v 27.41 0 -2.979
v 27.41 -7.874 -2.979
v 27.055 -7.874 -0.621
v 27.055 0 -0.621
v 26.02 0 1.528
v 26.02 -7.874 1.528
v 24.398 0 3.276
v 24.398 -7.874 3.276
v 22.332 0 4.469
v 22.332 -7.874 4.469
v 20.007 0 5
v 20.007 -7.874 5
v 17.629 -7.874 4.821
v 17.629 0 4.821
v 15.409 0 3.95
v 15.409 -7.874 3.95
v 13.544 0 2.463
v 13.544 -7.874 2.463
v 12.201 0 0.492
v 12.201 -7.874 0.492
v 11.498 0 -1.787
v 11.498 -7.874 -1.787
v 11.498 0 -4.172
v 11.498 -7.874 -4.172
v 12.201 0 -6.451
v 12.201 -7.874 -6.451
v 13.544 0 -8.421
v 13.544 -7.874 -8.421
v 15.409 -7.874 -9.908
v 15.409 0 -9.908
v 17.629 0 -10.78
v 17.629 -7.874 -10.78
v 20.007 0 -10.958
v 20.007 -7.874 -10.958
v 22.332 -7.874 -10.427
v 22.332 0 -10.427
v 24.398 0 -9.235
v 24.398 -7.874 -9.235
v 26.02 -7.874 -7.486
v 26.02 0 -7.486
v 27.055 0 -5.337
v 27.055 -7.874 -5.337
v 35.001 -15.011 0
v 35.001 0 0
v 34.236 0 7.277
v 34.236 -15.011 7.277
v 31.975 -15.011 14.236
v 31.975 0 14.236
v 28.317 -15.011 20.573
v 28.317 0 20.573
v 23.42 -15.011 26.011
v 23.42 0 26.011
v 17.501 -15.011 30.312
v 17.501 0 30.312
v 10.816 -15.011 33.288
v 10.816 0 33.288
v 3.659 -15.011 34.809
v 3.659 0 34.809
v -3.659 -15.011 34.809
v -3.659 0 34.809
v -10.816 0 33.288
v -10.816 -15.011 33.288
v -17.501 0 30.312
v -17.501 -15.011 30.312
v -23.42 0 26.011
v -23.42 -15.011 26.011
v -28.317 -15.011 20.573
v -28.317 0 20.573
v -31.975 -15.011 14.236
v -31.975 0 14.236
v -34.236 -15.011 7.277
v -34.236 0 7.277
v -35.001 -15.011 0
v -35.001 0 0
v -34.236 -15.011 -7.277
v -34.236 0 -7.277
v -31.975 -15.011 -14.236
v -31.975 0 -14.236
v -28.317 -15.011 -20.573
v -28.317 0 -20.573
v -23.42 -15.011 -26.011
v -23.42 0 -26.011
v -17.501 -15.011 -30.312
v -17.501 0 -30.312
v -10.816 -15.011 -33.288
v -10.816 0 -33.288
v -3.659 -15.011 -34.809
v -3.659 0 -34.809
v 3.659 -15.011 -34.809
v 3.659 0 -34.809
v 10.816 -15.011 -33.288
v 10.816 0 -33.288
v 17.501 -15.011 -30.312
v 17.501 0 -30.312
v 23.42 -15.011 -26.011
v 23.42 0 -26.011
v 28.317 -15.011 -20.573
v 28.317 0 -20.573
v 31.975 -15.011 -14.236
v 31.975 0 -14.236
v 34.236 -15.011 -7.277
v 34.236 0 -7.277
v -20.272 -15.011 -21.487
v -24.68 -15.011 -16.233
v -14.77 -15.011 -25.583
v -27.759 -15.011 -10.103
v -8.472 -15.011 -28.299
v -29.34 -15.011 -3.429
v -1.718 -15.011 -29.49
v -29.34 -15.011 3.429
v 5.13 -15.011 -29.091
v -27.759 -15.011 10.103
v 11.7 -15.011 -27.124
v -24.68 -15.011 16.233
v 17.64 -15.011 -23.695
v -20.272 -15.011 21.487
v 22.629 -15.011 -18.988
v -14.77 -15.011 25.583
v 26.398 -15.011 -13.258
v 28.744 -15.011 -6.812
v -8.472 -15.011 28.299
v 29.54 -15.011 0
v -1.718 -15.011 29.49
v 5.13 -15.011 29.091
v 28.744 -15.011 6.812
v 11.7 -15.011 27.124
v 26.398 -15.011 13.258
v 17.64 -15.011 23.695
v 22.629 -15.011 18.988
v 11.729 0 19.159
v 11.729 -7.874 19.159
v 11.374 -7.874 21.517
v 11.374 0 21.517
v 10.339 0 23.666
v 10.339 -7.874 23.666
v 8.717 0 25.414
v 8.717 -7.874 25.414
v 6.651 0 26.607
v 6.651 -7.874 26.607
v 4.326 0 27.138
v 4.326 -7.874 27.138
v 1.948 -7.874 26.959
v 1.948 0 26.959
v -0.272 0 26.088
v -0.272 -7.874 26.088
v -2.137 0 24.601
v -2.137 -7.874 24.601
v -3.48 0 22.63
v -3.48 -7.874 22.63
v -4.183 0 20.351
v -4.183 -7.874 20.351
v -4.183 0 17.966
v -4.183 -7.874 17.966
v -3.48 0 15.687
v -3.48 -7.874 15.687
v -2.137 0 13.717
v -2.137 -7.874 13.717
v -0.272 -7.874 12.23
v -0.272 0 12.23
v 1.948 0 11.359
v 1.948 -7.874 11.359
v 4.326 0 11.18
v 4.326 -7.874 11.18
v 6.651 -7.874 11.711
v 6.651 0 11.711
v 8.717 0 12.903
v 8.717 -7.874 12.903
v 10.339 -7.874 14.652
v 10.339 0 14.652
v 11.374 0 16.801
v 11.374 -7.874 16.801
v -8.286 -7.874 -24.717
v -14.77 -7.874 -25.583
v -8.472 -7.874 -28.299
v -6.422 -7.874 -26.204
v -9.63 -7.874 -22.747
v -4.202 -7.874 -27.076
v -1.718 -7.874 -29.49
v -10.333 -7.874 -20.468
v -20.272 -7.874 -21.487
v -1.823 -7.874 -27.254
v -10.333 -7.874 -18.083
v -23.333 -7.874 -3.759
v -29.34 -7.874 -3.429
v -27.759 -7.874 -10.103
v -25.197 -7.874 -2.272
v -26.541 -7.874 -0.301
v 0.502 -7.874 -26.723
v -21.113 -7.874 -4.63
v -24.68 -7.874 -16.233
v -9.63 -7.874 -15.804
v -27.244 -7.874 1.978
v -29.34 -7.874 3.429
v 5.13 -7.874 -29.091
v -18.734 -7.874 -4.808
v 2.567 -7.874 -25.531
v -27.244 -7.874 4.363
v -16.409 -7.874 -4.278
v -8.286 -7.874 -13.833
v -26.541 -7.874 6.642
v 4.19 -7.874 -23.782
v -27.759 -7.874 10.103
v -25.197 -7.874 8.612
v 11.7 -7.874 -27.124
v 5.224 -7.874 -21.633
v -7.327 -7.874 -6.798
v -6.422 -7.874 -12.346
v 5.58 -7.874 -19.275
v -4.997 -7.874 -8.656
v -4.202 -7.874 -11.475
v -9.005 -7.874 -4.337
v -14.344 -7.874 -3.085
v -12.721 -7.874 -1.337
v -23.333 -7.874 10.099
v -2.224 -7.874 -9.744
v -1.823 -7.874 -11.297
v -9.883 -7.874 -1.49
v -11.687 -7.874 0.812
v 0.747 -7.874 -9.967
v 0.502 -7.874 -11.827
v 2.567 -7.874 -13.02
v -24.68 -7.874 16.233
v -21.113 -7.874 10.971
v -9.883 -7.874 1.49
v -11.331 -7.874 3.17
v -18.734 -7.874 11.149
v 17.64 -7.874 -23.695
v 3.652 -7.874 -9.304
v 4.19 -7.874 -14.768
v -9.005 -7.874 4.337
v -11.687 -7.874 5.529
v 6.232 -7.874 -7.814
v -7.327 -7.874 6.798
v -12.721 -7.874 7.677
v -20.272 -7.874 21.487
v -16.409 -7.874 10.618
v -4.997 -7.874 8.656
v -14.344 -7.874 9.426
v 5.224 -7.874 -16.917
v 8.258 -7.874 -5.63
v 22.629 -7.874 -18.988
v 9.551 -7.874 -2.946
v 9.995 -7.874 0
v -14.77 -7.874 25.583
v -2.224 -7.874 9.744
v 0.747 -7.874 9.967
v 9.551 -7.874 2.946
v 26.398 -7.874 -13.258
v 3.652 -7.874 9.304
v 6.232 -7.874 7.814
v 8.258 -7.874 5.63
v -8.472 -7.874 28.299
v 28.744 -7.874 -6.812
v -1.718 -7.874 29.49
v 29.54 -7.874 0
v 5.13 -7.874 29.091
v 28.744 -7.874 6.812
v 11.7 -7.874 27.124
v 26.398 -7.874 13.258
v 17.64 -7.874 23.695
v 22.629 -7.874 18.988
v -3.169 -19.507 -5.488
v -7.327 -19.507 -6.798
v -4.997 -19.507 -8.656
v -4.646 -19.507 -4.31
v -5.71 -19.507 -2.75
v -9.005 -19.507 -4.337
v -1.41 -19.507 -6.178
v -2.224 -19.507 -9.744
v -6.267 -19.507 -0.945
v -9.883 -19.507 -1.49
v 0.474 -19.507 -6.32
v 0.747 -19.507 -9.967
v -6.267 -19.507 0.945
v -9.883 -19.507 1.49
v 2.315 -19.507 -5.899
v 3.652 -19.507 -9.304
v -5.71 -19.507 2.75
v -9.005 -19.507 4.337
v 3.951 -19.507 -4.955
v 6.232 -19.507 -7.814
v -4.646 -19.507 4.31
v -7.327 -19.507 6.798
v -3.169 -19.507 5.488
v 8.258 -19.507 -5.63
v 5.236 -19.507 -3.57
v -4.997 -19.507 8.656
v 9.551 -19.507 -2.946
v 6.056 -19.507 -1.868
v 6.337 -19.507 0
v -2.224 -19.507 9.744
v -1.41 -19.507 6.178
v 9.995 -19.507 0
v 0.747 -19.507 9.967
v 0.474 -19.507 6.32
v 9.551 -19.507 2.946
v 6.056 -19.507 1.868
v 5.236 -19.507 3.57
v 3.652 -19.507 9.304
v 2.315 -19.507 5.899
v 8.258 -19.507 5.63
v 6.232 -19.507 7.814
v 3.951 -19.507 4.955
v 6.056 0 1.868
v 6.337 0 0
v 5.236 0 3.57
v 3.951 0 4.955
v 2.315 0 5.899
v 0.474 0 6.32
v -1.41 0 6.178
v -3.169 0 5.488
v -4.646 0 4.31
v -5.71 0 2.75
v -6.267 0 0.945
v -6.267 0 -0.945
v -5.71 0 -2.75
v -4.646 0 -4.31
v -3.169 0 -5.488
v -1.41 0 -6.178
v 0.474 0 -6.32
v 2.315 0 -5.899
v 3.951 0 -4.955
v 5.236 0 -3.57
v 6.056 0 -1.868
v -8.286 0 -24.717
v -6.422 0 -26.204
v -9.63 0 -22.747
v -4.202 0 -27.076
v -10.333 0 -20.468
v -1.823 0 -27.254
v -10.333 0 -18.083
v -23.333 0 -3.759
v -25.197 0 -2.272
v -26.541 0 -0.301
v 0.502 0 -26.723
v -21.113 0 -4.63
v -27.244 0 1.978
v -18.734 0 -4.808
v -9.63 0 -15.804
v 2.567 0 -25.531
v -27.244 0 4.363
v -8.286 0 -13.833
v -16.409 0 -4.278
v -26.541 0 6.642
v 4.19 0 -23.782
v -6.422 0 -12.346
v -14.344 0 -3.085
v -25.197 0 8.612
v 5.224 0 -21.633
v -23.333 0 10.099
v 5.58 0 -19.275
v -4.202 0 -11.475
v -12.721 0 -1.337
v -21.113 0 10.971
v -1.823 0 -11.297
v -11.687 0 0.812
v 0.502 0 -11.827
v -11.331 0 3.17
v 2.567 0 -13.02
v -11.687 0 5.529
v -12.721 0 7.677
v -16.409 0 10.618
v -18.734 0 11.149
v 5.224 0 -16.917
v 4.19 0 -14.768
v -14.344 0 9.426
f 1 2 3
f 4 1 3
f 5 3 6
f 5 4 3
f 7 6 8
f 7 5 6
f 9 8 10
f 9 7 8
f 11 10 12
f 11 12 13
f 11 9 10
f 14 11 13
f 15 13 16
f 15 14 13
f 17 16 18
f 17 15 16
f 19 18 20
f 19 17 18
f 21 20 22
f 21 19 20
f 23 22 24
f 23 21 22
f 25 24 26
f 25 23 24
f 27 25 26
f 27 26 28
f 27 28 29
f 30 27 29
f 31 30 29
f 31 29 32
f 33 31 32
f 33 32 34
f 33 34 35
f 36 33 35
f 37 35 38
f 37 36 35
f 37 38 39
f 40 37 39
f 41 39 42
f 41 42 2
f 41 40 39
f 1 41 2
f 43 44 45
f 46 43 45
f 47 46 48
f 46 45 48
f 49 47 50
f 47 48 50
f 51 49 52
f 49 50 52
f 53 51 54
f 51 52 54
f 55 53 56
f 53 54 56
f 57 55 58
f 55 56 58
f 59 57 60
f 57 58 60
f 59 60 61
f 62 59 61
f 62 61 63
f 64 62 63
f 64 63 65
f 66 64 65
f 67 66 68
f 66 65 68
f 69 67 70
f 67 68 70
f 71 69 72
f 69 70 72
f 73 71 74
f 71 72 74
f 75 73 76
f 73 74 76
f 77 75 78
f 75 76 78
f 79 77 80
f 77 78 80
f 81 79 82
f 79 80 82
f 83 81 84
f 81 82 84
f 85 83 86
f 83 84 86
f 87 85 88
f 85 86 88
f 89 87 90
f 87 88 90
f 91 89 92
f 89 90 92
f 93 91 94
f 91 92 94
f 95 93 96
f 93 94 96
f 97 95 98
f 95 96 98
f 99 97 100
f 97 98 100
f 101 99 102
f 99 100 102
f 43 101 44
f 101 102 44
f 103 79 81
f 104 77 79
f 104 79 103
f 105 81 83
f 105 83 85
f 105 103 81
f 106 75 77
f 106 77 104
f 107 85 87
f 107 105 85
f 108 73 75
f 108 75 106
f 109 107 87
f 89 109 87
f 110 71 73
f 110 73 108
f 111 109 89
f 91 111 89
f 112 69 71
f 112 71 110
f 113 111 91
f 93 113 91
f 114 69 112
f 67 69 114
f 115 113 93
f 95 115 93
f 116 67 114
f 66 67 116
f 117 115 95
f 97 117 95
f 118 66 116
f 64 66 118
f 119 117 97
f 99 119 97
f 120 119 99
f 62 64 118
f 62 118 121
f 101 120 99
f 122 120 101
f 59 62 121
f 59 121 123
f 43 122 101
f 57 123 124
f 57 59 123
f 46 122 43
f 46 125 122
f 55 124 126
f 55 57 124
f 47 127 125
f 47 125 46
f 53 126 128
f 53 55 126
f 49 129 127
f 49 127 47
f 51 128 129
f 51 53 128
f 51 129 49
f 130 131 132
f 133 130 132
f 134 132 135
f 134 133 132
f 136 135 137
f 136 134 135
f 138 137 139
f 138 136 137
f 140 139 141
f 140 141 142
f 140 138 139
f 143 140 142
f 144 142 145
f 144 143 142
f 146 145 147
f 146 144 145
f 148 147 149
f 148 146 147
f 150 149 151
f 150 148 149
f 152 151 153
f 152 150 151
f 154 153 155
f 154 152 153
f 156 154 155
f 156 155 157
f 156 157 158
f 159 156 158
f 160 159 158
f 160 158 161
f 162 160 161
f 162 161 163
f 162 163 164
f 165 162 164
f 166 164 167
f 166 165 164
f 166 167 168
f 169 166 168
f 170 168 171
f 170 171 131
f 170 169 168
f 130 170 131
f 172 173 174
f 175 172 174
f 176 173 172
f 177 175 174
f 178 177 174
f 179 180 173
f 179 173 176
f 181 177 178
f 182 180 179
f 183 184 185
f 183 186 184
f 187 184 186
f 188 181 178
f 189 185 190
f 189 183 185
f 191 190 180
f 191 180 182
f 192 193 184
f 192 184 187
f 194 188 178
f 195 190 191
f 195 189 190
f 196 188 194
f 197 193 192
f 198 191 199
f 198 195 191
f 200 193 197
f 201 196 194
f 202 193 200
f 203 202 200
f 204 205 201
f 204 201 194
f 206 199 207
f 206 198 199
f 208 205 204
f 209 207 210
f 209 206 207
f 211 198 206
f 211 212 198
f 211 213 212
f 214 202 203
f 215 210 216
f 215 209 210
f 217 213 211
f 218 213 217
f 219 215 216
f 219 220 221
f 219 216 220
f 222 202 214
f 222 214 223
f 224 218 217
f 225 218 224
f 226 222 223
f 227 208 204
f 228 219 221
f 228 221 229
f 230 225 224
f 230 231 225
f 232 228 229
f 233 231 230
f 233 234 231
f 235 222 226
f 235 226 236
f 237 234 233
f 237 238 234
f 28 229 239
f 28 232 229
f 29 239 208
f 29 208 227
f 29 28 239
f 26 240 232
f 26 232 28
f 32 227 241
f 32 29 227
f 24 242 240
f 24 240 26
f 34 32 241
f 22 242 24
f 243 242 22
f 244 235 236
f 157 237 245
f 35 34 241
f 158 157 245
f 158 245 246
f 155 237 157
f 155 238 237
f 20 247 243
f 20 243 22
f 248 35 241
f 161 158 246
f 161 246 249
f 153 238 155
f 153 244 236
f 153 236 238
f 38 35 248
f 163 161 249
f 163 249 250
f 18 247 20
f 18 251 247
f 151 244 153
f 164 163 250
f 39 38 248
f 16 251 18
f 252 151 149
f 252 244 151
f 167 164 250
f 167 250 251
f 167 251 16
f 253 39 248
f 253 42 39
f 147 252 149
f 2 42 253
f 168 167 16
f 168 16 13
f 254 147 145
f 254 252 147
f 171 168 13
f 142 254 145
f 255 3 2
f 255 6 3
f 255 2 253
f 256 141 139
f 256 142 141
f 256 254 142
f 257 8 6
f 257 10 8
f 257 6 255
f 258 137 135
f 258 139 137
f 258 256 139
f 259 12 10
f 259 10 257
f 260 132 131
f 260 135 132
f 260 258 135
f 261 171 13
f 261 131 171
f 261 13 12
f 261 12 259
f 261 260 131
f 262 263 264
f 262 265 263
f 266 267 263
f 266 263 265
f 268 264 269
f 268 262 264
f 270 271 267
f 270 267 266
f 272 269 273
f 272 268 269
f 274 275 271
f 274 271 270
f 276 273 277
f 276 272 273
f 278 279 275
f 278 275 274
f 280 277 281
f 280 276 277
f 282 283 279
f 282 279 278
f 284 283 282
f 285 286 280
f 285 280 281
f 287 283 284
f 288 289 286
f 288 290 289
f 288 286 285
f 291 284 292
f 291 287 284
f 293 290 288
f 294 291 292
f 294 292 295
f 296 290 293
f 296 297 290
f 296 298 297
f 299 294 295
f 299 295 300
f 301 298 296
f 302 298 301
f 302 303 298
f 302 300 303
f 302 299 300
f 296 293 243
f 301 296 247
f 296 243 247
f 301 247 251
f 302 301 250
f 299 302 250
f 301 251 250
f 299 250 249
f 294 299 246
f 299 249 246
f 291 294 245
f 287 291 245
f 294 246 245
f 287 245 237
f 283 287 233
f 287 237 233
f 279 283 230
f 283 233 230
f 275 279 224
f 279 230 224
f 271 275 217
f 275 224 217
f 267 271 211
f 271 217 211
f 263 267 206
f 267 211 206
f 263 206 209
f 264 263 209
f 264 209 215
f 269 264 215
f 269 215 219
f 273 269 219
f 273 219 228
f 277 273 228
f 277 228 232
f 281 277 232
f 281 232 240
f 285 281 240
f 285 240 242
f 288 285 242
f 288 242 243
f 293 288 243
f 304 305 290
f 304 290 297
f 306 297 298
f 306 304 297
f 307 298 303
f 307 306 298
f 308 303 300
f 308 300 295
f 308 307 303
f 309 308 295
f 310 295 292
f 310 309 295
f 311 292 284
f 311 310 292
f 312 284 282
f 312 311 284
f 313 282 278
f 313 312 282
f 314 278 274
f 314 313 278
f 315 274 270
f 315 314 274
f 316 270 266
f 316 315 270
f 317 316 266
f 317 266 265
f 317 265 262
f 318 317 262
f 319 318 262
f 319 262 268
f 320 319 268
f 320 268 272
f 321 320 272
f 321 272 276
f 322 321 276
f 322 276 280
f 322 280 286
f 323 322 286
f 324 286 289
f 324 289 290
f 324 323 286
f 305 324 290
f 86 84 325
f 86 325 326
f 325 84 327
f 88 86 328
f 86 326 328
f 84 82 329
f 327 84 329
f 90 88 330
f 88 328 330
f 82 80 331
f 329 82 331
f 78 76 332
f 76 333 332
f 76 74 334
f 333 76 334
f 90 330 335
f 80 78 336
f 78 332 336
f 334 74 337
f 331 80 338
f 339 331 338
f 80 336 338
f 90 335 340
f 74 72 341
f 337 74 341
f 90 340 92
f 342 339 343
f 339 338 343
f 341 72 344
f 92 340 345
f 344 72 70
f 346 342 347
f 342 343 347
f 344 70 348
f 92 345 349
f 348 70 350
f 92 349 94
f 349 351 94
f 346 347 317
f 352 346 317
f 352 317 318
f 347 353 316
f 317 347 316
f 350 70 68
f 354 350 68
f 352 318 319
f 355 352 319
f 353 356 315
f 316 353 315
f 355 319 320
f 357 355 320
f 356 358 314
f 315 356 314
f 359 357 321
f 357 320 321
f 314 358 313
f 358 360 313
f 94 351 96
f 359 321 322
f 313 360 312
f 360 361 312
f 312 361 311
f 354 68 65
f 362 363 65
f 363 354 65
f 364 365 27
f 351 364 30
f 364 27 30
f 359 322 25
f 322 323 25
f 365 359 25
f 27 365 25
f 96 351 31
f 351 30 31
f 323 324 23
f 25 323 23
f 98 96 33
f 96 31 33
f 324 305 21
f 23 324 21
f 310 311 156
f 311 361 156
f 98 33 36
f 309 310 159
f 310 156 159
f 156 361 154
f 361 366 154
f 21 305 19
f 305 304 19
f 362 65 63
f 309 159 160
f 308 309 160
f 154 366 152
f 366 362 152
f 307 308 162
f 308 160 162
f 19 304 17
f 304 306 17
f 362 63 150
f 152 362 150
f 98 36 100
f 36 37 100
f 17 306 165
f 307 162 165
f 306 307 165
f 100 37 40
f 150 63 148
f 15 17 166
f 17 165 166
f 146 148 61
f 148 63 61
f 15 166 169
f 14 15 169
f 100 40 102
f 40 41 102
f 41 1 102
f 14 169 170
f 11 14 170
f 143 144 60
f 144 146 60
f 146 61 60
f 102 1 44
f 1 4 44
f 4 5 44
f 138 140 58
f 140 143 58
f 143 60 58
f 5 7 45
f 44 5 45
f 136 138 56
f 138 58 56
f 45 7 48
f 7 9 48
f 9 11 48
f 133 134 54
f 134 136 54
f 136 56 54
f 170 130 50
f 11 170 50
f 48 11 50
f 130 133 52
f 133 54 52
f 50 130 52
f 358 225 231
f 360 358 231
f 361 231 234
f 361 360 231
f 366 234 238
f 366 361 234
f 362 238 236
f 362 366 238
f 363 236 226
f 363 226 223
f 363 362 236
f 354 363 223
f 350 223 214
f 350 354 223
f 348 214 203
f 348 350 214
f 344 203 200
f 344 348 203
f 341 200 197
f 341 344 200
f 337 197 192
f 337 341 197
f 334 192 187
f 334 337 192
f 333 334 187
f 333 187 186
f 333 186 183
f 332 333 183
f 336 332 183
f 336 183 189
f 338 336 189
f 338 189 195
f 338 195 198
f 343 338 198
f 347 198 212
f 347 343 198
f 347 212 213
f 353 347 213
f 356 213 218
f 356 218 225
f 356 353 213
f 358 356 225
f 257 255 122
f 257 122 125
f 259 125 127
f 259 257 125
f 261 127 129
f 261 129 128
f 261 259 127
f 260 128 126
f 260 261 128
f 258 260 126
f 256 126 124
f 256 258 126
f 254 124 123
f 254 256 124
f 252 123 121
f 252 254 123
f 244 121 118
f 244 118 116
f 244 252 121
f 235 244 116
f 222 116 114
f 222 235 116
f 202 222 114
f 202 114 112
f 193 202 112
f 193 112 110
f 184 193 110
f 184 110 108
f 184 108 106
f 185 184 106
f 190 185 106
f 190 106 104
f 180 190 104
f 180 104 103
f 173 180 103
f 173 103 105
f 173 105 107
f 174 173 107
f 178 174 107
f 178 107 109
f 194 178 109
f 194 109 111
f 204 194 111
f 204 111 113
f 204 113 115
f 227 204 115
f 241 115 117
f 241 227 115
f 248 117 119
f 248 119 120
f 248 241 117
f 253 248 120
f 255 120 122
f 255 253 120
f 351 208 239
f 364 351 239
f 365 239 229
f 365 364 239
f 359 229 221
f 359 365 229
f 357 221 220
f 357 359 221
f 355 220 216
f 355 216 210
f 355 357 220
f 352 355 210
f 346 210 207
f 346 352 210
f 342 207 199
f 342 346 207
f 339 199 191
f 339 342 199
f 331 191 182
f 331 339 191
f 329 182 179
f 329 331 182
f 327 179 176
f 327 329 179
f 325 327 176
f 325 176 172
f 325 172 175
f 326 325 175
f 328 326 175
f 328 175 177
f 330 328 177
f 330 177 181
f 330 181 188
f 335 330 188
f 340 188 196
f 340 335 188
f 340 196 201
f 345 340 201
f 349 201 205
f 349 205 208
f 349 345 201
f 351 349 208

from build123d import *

# Parameters (mm, degrees)
F0_R     = 9.9949
F0_R_2   = 6.3373
F1_DEPTH = 19.5072
F0_R_3   = 29.5402
F0_R_4   = 8.001
F2_DEPTH = 7.874
F0_R_5   = 35.0012
F3_DEPTH = 15.0114


with BuildPart() as f1:
    # F0 (on Front) → F1 (new body)
    with BuildSketch(Plane.XZ):
        Circle(F0_R)
        Circle(F0_R_2, mode=Mode.SUBTRACT)
    extrude(amount=F1_DEPTH)

    # F0 (on Front) → F2 (join)
    with BuildSketch(Plane.XZ):
        Circle(F0_R_3)
        with Locations((-2.421228, -19.275159)):
            Circle(F0_R_4, mode=Mode.SUBTRACT)
        with Locations((19.409321, -2.979115)):
            Circle(F0_R_4, mode=Mode.SUBTRACT)
        with Locations((-19.332217, 3.170335)):
            Circle(F0_R_4, mode=Mode.SUBTRACT)
        Circle(F0_R, mode=Mode.SUBTRACT)
        with Locations((3.728223, 19.158907)):
            Circle(F0_R_4, mode=Mode.SUBTRACT)
    extrude(amount=F2_DEPTH)

    # F0 (on Front) → F3 (join)
    with BuildSketch(Plane.XZ):
        Circle(F0_R_5)
        Circle(F0_R_3, mode=Mode.SUBTRACT)
    extrude(amount=F3_DEPTH)


solid = f1.part
